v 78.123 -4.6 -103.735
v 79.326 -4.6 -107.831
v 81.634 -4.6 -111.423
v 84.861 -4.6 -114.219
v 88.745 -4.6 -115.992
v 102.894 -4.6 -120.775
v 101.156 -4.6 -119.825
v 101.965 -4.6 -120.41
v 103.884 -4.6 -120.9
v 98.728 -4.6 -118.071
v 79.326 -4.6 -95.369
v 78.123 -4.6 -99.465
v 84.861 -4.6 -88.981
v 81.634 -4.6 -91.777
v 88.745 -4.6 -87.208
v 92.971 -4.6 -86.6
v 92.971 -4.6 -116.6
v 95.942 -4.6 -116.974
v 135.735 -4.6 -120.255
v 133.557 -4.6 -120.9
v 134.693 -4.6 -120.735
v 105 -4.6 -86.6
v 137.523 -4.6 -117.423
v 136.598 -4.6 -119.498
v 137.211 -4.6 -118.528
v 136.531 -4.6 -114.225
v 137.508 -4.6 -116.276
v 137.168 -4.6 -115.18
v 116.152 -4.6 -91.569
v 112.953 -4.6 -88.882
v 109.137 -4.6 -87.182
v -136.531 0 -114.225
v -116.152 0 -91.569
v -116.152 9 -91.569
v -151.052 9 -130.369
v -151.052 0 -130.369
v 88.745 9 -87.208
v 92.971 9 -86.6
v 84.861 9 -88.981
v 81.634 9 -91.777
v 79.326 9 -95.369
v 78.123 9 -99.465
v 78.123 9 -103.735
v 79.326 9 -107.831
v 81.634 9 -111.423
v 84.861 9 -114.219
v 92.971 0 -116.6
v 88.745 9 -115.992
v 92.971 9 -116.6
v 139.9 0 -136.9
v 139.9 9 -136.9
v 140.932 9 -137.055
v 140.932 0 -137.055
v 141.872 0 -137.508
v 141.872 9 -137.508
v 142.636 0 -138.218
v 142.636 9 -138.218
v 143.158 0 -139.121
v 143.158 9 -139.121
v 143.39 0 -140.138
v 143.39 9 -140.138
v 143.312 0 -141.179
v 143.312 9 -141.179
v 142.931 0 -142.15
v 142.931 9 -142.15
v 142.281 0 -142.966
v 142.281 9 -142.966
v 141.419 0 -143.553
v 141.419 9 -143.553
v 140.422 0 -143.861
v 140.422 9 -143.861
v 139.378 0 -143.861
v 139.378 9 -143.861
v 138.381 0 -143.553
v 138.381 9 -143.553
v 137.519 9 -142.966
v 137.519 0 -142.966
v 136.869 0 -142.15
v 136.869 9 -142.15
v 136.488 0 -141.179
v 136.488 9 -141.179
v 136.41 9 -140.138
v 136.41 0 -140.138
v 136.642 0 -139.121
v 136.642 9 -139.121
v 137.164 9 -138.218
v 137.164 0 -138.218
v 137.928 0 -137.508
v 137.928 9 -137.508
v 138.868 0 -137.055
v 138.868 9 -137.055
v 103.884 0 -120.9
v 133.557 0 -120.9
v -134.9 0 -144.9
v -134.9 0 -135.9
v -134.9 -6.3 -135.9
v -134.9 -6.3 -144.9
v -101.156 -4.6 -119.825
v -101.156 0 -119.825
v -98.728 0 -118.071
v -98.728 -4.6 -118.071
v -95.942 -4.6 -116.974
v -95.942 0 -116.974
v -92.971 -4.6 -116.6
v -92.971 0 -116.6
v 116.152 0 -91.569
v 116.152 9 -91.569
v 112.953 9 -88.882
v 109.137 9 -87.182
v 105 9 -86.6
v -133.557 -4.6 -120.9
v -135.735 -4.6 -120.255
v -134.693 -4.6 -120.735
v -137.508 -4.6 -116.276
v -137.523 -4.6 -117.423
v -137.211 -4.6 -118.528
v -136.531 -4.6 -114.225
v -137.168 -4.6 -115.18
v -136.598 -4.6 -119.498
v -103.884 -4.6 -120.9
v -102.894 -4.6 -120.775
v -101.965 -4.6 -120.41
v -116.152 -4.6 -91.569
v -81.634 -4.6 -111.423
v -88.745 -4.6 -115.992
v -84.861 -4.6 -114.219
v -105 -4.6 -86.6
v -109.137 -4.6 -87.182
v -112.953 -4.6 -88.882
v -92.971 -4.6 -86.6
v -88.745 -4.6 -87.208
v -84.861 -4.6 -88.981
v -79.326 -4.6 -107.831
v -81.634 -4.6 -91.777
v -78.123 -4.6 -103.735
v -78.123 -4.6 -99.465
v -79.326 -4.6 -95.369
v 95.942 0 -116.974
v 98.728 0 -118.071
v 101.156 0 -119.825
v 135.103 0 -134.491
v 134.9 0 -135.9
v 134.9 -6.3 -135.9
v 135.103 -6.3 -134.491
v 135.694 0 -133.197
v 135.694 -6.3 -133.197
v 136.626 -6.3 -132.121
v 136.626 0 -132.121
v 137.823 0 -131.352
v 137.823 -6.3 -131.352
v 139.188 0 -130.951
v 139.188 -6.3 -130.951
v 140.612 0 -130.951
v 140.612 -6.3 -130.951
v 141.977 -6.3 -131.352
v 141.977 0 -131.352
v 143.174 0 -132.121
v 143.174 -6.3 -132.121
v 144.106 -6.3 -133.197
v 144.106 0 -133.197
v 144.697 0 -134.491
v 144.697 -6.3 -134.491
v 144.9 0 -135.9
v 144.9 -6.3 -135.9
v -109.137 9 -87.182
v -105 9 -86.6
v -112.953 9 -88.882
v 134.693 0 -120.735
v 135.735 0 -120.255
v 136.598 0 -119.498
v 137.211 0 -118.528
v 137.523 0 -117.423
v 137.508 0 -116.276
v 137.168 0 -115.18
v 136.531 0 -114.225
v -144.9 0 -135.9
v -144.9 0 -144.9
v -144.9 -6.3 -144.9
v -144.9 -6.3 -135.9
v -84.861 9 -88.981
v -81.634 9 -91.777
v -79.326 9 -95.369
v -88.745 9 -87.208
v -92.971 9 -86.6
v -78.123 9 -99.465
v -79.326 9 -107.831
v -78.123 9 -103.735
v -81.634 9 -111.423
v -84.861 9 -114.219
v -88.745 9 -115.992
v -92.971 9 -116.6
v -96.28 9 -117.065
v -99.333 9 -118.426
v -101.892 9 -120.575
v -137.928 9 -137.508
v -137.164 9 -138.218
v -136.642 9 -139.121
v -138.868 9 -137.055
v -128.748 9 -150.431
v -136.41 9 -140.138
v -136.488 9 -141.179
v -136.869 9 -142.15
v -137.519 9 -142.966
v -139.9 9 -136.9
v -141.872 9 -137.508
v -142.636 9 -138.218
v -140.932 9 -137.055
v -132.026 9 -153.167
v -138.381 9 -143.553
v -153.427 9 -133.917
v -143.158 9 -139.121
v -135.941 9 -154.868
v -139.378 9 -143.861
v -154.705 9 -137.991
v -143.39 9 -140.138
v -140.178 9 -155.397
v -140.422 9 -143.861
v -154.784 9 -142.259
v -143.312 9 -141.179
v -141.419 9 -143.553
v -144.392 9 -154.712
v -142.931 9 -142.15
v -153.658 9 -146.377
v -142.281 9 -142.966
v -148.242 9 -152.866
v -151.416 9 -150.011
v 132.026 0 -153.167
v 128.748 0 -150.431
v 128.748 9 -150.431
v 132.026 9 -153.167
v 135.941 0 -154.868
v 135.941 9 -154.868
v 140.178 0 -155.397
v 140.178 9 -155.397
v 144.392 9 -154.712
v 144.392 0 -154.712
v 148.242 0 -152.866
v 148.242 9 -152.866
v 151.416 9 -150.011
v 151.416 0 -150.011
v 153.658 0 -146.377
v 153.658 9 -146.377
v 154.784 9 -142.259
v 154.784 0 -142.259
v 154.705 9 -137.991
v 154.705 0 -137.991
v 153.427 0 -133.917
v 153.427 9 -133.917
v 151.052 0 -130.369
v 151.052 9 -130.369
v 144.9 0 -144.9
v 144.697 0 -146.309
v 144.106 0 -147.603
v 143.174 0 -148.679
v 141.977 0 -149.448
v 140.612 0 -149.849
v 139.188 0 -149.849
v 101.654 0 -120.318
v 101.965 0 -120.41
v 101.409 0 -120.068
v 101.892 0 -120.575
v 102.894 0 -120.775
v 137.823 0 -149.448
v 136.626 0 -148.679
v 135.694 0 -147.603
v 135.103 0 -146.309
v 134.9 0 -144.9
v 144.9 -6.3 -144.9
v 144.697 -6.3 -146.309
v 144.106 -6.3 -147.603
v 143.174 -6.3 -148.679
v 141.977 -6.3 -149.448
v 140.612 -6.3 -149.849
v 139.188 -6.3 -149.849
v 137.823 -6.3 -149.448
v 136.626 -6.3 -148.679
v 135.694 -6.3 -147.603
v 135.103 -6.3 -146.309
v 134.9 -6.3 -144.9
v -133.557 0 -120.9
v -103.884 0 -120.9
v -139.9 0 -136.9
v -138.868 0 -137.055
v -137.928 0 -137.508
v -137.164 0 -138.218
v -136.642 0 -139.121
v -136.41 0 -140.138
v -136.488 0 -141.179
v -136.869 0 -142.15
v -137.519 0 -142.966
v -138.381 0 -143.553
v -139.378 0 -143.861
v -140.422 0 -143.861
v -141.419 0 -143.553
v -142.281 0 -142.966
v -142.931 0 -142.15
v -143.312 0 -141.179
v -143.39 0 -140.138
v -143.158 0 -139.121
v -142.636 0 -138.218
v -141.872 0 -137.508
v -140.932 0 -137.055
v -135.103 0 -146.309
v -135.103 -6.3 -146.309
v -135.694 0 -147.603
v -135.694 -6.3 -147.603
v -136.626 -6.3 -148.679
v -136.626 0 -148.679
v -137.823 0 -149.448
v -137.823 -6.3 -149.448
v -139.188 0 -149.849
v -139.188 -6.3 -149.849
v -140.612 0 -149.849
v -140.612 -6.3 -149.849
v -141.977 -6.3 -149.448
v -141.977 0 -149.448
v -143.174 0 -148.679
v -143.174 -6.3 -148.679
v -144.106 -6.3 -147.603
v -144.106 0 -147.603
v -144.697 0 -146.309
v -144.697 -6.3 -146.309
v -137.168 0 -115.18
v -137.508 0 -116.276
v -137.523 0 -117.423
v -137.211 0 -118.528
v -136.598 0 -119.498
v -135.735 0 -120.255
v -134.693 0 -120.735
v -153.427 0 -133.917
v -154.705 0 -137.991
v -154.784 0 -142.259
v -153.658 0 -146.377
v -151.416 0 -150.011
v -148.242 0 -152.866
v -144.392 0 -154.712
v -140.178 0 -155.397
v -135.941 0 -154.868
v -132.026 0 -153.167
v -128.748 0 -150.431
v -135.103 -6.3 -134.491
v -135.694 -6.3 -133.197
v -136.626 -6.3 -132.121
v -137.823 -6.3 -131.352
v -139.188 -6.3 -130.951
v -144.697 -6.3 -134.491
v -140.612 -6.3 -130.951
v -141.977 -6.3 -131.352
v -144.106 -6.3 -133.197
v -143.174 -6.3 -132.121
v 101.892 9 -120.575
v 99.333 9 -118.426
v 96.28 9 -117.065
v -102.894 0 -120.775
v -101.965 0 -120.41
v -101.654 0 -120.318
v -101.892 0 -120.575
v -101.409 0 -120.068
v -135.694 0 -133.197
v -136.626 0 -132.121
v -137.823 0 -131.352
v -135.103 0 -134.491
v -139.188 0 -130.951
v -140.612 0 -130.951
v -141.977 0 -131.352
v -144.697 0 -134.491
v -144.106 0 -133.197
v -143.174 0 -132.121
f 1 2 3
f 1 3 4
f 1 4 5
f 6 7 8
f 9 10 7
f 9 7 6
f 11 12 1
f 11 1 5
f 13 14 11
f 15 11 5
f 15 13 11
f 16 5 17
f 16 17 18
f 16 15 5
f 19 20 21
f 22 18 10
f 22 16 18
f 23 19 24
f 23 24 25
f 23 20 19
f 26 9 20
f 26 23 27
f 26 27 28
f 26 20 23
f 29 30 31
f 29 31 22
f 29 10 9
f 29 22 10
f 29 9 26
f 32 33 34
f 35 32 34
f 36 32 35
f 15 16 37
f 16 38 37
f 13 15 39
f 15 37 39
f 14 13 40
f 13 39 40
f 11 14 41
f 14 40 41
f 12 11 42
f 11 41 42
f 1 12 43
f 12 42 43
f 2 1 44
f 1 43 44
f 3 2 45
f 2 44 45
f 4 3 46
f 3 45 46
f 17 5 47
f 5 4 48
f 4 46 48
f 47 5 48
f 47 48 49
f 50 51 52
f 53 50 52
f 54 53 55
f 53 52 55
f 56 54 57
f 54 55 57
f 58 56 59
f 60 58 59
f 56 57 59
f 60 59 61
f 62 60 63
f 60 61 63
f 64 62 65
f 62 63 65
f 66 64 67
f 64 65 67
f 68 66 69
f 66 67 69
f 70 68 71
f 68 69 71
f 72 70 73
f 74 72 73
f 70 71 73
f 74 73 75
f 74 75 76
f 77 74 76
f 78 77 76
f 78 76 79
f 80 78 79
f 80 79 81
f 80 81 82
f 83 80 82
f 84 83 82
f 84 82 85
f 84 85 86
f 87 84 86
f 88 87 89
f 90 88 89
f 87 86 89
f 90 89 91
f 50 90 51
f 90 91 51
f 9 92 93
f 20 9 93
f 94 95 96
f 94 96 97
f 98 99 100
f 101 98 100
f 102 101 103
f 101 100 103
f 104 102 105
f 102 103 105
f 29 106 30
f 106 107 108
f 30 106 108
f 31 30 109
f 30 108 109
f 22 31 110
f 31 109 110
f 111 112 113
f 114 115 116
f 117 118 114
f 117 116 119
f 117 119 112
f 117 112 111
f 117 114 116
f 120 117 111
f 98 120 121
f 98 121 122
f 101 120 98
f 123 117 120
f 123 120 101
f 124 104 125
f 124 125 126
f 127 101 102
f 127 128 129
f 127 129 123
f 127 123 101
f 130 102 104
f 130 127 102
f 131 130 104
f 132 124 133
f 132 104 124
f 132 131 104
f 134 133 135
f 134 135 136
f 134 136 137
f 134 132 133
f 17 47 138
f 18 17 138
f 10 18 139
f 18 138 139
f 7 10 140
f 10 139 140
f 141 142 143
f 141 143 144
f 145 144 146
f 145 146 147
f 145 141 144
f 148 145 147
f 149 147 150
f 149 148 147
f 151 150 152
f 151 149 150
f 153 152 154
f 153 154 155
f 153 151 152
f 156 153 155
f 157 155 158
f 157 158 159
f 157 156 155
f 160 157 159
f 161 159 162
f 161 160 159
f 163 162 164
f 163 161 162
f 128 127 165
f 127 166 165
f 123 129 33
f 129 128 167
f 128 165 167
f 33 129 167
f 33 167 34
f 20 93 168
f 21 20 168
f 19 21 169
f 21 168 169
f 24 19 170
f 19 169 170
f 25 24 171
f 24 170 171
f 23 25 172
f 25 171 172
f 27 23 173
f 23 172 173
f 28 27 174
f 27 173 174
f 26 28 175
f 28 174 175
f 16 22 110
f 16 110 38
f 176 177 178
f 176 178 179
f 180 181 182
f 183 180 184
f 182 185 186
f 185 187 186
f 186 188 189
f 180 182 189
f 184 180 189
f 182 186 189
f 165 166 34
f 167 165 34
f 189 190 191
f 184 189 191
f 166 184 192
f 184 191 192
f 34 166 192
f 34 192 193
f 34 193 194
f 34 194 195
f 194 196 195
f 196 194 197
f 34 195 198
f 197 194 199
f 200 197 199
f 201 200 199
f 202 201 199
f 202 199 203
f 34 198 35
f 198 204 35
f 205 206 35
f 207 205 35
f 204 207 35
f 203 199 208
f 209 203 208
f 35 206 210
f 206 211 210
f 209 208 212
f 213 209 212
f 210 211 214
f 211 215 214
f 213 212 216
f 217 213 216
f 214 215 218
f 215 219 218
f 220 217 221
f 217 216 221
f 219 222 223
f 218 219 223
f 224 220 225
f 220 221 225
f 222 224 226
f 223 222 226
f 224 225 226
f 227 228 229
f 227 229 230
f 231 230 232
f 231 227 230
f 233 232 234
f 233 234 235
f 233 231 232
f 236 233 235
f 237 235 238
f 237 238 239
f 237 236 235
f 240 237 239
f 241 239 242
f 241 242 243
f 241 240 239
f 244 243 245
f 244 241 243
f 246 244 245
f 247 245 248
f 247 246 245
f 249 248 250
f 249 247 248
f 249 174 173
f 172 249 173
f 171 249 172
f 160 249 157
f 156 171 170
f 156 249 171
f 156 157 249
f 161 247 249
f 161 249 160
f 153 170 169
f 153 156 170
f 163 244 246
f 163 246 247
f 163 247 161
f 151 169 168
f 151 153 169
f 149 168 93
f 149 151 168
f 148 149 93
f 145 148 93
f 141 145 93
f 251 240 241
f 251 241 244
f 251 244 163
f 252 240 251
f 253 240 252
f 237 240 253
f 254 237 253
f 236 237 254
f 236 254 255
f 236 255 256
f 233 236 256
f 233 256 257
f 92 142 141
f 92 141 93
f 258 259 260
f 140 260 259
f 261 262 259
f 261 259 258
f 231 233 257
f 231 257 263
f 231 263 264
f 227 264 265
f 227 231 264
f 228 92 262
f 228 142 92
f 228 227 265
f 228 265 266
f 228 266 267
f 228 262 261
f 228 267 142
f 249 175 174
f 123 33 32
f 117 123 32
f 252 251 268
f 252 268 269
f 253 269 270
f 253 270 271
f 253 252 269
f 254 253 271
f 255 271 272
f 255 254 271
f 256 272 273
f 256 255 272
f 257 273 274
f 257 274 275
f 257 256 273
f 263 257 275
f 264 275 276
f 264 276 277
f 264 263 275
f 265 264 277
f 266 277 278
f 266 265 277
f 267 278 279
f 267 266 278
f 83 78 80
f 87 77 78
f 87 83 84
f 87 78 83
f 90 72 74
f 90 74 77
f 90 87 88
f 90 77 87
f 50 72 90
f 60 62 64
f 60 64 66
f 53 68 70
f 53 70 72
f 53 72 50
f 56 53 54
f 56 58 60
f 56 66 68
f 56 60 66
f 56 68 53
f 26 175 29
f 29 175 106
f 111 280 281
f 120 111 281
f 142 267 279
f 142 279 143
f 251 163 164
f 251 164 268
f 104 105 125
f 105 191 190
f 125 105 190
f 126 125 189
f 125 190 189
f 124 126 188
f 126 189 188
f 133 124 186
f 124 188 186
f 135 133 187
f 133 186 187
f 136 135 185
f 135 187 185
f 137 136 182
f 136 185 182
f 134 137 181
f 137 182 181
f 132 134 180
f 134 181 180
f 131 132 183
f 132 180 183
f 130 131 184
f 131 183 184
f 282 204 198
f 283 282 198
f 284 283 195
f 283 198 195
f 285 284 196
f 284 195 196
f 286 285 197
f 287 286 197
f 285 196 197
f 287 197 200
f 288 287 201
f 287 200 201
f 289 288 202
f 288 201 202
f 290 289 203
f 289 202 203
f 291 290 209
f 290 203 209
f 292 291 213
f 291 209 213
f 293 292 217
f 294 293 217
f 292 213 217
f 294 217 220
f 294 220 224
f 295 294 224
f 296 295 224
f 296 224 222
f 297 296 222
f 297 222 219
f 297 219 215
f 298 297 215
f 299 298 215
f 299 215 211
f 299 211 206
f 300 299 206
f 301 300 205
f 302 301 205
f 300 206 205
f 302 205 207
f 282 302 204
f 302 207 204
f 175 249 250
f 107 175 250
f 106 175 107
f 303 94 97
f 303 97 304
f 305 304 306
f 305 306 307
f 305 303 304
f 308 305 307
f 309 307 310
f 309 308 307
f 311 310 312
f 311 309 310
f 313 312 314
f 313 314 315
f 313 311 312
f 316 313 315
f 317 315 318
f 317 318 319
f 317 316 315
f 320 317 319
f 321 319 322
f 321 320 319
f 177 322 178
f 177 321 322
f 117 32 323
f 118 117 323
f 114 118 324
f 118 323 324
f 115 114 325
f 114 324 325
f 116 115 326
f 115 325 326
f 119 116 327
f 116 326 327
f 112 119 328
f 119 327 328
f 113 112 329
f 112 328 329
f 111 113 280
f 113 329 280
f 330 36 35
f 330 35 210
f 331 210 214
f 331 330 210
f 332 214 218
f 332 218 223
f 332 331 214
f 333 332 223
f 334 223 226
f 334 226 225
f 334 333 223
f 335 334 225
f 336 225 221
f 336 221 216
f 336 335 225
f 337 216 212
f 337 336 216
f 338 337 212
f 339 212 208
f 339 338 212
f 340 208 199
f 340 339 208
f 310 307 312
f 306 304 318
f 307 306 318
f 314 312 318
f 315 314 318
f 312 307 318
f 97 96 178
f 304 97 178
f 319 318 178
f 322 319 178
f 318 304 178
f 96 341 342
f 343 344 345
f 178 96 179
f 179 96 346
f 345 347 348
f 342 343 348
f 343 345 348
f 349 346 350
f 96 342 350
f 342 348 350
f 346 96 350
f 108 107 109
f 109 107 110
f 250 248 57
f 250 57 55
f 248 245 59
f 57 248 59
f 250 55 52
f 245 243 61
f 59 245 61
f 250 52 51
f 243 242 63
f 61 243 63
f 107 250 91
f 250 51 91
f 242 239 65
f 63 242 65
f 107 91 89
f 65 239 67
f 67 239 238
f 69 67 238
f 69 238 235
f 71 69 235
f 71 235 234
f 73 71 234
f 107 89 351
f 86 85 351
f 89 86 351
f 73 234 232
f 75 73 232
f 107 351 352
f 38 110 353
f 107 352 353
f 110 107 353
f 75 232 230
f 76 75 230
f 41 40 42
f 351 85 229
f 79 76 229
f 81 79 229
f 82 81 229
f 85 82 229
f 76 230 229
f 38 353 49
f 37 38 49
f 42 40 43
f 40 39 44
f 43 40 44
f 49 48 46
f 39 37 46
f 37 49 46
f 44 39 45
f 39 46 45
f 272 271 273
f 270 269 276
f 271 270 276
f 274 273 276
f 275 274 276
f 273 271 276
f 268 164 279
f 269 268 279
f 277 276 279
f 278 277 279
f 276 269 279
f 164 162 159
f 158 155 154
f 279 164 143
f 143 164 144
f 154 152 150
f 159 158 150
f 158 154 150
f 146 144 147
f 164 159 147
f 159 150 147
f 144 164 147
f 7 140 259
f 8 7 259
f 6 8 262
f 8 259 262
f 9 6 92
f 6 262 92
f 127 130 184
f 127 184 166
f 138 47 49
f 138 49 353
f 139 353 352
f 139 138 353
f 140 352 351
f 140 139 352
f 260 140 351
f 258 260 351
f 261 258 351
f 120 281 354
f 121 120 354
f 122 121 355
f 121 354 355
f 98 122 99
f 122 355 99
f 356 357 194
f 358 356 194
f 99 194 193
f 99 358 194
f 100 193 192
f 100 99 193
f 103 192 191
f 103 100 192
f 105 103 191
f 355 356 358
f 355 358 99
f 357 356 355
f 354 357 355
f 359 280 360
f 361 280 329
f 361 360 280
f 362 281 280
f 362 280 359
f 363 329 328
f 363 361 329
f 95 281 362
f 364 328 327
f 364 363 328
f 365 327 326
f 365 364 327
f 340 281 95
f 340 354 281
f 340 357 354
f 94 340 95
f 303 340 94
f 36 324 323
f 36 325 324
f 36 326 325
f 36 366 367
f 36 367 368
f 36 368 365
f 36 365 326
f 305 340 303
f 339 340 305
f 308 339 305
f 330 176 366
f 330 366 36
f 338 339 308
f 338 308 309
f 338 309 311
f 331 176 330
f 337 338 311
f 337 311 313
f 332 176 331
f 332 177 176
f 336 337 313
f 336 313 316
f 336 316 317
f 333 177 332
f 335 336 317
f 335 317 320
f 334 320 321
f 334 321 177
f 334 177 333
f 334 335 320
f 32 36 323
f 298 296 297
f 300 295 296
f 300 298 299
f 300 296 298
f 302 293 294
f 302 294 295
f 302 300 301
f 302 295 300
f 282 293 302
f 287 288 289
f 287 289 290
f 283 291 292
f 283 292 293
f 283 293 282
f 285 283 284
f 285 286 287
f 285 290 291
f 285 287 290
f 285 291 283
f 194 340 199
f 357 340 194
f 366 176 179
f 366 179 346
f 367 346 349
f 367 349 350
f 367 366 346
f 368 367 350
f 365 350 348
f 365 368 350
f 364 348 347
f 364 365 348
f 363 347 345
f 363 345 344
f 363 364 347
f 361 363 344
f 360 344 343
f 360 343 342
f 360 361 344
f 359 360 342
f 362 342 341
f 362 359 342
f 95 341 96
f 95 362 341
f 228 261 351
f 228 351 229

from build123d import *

# Parameters (mm, degrees)
BOSS_EXTRUDE1_DEPTH = 9
CUT_EXTRUDE1_DEPTH  = 220.600022769
BOSS_EXTRUDE2_DEPTH = 6.3
BOSS_EXTRUDE3_DEPTH = 4.6
SKETCH7_R           = 3.5
CUT_EXTRUDE2_DEPTH  = 9


with BuildPart() as part:
    # Sketch1 → Boss-Extrude1 (new body)
    with BuildSketch(Plane(origin=(0, 0, 0), x_dir=(1, 0, 0), z_dir=(0, 1, 0))):
        with BuildLine():
            Line((-128.747729842, 150.431294549), (-101.892422534, 120.574964361))
            ThreePointArc((-101.892422534, 120.574964361), (-97.854230693, 117.638694702), (-92.970606408, 116.6))
            Line((-92.970606408, 116.6), (92.970606408, 116.6))
            ThreePointArc((92.970606408, 116.6), (97.854230693, 117.638694702), (101.892422534, 120.574964361))
            Line((101.892422534, 120.574964361), (128.747729842, 150.431294549))
            ThreePointArc((128.747729842, 150.431294549), (149.931294549, 151.552270158), (151.052270158, 130.368705451))
            Line((151.052270158, 130.368705451), (116.152270158, 91.568705451))
            ThreePointArc((116.152270158, 91.568705451), (111.104530357, 87.898368378), (105, 86.6))
            Line((105, 86.6), (-105, 86.6))
            ThreePointArc((-105, 86.6), (-111.104530357, 87.898368378), (-116.152270158, 91.568705451))
            Line((-116.152270158, 91.568705451), (-151.052270158, 130.368705451))
            ThreePointArc((-151.052270158, 130.368705451), (-149.931294549, 151.552270158), (-128.747729842, 150.431294549))
        make_face()
    extrude(amount=BOSS_EXTRUDE1_DEPTH)

    # Sketch3 → Cut-Extrude1 (cut, through all)
    with BuildSketch(Plane(origin=(0, 9, 0), x_dir=(1, 0, 0), z_dir=(0, 1, 0))):
        with BuildLine():
            Line((-92.970606408, 116.6), (92.970606408, 116.6))
            ThreePointArc((92.970606408, 116.6), (77.970606408, 101.6), (92.970606408, 86.6))
            Line((92.970606408, 86.6), (-92.970606408, 86.6))
            ThreePointArc((-92.970606408, 86.6), (-77.970606408, 101.6), (-92.970606408, 116.6))
        make_face()
    extrude(amount=-CUT_EXTRUDE1_DEPTH, mode=Mode.SUBTRACT)


with BuildPart() as cut_extrude1_piece_1:
    # of the separate pieces the step leaves, piece 1, a body of its own (cut_extrude1_pieces)
    add(part.part.solids().sort_by_distance((92.970606408, 0, -116.6))[0])



with BuildPart() as cut_extrude1_piece_2:
    # of the separate pieces the step leaves, piece 2, a body of its own (cut_extrude1_pieces)
    add(part.part.solids().sort_by_distance((-128.747729842, 0, -150.431294549))[0])


with BuildPart() as cut_extrude1_piece_1_1:
    add(cut_extrude1_piece_1.part)

    add(cut_extrude1_piece_2.part)  # Boss-Extrude2 merges Cut-Extrude1 piece 2
    # Sketch4 → Boss-Extrude2 (add)
    with BuildSketch(Plane.XZ):
        with BuildLine():
            Line((-134.9, -135.9), (-134.9, -144.9))
            ThreePointArc((-134.9, -144.9), (-139.9, -149.9), (-144.9, -144.9))
            Line((-144.9, -144.9), (-144.9, -135.9))
            ThreePointArc((-144.9, -135.9), (-139.9, -130.9), (-134.9, -135.9))
        make_face()
        with BuildLine():
            Line((144.9, -135.9), (144.9, -144.9))
            ThreePointArc((144.9, -144.9), (139.9, -149.9), (134.9, -144.9))
            Line((134.9, -144.9), (134.9, -135.9))
            ThreePointArc((134.9, -135.9), (139.9, -130.9), (144.9, -135.9))
        make_face()
    extrude(amount=BOSS_EXTRUDE2_DEPTH)

    # Sketch6 → Boss-Extrude3 (add)
    with BuildSketch(Plane.XZ):
        with BuildLine():
            Line((-133.557307355, -120.9), (-103.884359199, -120.9))
            ThreePointArc((-103.884359199, -120.9), (-102.41807137, -120.621558813), (-101.155921001, -119.825))
            ThreePointArc((-101.155921001, -119.825), (-97.369469897, -117.43532356), (-92.970606408, -116.6))
            ThreePointArc((-92.970606408, -116.6), (-77.970606408, -101.6), (-92.970606408, -86.6))
            Line((-92.970606408, -86.6), (-105, -86.6))
            ThreePointArc((-105, -86.6), (-111.104530357, -87.898368378), (-116.152270158, -91.568705451))
            Line((-116.152270158, -91.568705451), (-136.531246064, -114.22498812))
            ThreePointArc((-136.531246064, -114.22498812), (-137.211075788, -118.527874762), (-133.557307355, -120.9))
        make_face()
        with BuildLine():
            Line((103.884359199, -120.9), (133.557307355, -120.9))
            ThreePointArc((133.557307355, -120.9), (137.211075788, -118.527874762), (136.531246064, -114.22498812))
            Line((136.531246064, -114.22498812), (116.152270158, -91.568705451))
            ThreePointArc((116.152270158, -91.568705451), (111.104530357, -87.898368378), (105, -86.6))
            Line((105, -86.6), (92.970606408, -86.6))
            ThreePointArc((92.970606408, -86.6), (77.970606408, -101.6), (92.970606408, -116.6))
            ThreePointArc((92.970606408, -116.6), (97.369469897, -117.43532356), (101.155921001, -119.825))
            ThreePointArc((101.155921001, -119.825), (102.41807137, -120.621558813), (103.884359199, -120.9))
        make_face()
    extrude(amount=BOSS_EXTRUDE3_DEPTH)

    # Sketch7 → Cut-Extrude2 (cut)
    with BuildSketch(Plane(origin=(0, 9, 0), x_dir=(1, 0, 0), z_dir=(0, 1, 0))):
        with Locations((-139.9, 140.4)):
            Circle(SKETCH7_R)
        with Locations((139.9, 140.4)):
            Circle(SKETCH7_R)
    extrude(amount=-CUT_EXTRUDE2_DEPTH, mode=Mode.SUBTRACT)


solid = cut_extrude1_piece_1_1.part
